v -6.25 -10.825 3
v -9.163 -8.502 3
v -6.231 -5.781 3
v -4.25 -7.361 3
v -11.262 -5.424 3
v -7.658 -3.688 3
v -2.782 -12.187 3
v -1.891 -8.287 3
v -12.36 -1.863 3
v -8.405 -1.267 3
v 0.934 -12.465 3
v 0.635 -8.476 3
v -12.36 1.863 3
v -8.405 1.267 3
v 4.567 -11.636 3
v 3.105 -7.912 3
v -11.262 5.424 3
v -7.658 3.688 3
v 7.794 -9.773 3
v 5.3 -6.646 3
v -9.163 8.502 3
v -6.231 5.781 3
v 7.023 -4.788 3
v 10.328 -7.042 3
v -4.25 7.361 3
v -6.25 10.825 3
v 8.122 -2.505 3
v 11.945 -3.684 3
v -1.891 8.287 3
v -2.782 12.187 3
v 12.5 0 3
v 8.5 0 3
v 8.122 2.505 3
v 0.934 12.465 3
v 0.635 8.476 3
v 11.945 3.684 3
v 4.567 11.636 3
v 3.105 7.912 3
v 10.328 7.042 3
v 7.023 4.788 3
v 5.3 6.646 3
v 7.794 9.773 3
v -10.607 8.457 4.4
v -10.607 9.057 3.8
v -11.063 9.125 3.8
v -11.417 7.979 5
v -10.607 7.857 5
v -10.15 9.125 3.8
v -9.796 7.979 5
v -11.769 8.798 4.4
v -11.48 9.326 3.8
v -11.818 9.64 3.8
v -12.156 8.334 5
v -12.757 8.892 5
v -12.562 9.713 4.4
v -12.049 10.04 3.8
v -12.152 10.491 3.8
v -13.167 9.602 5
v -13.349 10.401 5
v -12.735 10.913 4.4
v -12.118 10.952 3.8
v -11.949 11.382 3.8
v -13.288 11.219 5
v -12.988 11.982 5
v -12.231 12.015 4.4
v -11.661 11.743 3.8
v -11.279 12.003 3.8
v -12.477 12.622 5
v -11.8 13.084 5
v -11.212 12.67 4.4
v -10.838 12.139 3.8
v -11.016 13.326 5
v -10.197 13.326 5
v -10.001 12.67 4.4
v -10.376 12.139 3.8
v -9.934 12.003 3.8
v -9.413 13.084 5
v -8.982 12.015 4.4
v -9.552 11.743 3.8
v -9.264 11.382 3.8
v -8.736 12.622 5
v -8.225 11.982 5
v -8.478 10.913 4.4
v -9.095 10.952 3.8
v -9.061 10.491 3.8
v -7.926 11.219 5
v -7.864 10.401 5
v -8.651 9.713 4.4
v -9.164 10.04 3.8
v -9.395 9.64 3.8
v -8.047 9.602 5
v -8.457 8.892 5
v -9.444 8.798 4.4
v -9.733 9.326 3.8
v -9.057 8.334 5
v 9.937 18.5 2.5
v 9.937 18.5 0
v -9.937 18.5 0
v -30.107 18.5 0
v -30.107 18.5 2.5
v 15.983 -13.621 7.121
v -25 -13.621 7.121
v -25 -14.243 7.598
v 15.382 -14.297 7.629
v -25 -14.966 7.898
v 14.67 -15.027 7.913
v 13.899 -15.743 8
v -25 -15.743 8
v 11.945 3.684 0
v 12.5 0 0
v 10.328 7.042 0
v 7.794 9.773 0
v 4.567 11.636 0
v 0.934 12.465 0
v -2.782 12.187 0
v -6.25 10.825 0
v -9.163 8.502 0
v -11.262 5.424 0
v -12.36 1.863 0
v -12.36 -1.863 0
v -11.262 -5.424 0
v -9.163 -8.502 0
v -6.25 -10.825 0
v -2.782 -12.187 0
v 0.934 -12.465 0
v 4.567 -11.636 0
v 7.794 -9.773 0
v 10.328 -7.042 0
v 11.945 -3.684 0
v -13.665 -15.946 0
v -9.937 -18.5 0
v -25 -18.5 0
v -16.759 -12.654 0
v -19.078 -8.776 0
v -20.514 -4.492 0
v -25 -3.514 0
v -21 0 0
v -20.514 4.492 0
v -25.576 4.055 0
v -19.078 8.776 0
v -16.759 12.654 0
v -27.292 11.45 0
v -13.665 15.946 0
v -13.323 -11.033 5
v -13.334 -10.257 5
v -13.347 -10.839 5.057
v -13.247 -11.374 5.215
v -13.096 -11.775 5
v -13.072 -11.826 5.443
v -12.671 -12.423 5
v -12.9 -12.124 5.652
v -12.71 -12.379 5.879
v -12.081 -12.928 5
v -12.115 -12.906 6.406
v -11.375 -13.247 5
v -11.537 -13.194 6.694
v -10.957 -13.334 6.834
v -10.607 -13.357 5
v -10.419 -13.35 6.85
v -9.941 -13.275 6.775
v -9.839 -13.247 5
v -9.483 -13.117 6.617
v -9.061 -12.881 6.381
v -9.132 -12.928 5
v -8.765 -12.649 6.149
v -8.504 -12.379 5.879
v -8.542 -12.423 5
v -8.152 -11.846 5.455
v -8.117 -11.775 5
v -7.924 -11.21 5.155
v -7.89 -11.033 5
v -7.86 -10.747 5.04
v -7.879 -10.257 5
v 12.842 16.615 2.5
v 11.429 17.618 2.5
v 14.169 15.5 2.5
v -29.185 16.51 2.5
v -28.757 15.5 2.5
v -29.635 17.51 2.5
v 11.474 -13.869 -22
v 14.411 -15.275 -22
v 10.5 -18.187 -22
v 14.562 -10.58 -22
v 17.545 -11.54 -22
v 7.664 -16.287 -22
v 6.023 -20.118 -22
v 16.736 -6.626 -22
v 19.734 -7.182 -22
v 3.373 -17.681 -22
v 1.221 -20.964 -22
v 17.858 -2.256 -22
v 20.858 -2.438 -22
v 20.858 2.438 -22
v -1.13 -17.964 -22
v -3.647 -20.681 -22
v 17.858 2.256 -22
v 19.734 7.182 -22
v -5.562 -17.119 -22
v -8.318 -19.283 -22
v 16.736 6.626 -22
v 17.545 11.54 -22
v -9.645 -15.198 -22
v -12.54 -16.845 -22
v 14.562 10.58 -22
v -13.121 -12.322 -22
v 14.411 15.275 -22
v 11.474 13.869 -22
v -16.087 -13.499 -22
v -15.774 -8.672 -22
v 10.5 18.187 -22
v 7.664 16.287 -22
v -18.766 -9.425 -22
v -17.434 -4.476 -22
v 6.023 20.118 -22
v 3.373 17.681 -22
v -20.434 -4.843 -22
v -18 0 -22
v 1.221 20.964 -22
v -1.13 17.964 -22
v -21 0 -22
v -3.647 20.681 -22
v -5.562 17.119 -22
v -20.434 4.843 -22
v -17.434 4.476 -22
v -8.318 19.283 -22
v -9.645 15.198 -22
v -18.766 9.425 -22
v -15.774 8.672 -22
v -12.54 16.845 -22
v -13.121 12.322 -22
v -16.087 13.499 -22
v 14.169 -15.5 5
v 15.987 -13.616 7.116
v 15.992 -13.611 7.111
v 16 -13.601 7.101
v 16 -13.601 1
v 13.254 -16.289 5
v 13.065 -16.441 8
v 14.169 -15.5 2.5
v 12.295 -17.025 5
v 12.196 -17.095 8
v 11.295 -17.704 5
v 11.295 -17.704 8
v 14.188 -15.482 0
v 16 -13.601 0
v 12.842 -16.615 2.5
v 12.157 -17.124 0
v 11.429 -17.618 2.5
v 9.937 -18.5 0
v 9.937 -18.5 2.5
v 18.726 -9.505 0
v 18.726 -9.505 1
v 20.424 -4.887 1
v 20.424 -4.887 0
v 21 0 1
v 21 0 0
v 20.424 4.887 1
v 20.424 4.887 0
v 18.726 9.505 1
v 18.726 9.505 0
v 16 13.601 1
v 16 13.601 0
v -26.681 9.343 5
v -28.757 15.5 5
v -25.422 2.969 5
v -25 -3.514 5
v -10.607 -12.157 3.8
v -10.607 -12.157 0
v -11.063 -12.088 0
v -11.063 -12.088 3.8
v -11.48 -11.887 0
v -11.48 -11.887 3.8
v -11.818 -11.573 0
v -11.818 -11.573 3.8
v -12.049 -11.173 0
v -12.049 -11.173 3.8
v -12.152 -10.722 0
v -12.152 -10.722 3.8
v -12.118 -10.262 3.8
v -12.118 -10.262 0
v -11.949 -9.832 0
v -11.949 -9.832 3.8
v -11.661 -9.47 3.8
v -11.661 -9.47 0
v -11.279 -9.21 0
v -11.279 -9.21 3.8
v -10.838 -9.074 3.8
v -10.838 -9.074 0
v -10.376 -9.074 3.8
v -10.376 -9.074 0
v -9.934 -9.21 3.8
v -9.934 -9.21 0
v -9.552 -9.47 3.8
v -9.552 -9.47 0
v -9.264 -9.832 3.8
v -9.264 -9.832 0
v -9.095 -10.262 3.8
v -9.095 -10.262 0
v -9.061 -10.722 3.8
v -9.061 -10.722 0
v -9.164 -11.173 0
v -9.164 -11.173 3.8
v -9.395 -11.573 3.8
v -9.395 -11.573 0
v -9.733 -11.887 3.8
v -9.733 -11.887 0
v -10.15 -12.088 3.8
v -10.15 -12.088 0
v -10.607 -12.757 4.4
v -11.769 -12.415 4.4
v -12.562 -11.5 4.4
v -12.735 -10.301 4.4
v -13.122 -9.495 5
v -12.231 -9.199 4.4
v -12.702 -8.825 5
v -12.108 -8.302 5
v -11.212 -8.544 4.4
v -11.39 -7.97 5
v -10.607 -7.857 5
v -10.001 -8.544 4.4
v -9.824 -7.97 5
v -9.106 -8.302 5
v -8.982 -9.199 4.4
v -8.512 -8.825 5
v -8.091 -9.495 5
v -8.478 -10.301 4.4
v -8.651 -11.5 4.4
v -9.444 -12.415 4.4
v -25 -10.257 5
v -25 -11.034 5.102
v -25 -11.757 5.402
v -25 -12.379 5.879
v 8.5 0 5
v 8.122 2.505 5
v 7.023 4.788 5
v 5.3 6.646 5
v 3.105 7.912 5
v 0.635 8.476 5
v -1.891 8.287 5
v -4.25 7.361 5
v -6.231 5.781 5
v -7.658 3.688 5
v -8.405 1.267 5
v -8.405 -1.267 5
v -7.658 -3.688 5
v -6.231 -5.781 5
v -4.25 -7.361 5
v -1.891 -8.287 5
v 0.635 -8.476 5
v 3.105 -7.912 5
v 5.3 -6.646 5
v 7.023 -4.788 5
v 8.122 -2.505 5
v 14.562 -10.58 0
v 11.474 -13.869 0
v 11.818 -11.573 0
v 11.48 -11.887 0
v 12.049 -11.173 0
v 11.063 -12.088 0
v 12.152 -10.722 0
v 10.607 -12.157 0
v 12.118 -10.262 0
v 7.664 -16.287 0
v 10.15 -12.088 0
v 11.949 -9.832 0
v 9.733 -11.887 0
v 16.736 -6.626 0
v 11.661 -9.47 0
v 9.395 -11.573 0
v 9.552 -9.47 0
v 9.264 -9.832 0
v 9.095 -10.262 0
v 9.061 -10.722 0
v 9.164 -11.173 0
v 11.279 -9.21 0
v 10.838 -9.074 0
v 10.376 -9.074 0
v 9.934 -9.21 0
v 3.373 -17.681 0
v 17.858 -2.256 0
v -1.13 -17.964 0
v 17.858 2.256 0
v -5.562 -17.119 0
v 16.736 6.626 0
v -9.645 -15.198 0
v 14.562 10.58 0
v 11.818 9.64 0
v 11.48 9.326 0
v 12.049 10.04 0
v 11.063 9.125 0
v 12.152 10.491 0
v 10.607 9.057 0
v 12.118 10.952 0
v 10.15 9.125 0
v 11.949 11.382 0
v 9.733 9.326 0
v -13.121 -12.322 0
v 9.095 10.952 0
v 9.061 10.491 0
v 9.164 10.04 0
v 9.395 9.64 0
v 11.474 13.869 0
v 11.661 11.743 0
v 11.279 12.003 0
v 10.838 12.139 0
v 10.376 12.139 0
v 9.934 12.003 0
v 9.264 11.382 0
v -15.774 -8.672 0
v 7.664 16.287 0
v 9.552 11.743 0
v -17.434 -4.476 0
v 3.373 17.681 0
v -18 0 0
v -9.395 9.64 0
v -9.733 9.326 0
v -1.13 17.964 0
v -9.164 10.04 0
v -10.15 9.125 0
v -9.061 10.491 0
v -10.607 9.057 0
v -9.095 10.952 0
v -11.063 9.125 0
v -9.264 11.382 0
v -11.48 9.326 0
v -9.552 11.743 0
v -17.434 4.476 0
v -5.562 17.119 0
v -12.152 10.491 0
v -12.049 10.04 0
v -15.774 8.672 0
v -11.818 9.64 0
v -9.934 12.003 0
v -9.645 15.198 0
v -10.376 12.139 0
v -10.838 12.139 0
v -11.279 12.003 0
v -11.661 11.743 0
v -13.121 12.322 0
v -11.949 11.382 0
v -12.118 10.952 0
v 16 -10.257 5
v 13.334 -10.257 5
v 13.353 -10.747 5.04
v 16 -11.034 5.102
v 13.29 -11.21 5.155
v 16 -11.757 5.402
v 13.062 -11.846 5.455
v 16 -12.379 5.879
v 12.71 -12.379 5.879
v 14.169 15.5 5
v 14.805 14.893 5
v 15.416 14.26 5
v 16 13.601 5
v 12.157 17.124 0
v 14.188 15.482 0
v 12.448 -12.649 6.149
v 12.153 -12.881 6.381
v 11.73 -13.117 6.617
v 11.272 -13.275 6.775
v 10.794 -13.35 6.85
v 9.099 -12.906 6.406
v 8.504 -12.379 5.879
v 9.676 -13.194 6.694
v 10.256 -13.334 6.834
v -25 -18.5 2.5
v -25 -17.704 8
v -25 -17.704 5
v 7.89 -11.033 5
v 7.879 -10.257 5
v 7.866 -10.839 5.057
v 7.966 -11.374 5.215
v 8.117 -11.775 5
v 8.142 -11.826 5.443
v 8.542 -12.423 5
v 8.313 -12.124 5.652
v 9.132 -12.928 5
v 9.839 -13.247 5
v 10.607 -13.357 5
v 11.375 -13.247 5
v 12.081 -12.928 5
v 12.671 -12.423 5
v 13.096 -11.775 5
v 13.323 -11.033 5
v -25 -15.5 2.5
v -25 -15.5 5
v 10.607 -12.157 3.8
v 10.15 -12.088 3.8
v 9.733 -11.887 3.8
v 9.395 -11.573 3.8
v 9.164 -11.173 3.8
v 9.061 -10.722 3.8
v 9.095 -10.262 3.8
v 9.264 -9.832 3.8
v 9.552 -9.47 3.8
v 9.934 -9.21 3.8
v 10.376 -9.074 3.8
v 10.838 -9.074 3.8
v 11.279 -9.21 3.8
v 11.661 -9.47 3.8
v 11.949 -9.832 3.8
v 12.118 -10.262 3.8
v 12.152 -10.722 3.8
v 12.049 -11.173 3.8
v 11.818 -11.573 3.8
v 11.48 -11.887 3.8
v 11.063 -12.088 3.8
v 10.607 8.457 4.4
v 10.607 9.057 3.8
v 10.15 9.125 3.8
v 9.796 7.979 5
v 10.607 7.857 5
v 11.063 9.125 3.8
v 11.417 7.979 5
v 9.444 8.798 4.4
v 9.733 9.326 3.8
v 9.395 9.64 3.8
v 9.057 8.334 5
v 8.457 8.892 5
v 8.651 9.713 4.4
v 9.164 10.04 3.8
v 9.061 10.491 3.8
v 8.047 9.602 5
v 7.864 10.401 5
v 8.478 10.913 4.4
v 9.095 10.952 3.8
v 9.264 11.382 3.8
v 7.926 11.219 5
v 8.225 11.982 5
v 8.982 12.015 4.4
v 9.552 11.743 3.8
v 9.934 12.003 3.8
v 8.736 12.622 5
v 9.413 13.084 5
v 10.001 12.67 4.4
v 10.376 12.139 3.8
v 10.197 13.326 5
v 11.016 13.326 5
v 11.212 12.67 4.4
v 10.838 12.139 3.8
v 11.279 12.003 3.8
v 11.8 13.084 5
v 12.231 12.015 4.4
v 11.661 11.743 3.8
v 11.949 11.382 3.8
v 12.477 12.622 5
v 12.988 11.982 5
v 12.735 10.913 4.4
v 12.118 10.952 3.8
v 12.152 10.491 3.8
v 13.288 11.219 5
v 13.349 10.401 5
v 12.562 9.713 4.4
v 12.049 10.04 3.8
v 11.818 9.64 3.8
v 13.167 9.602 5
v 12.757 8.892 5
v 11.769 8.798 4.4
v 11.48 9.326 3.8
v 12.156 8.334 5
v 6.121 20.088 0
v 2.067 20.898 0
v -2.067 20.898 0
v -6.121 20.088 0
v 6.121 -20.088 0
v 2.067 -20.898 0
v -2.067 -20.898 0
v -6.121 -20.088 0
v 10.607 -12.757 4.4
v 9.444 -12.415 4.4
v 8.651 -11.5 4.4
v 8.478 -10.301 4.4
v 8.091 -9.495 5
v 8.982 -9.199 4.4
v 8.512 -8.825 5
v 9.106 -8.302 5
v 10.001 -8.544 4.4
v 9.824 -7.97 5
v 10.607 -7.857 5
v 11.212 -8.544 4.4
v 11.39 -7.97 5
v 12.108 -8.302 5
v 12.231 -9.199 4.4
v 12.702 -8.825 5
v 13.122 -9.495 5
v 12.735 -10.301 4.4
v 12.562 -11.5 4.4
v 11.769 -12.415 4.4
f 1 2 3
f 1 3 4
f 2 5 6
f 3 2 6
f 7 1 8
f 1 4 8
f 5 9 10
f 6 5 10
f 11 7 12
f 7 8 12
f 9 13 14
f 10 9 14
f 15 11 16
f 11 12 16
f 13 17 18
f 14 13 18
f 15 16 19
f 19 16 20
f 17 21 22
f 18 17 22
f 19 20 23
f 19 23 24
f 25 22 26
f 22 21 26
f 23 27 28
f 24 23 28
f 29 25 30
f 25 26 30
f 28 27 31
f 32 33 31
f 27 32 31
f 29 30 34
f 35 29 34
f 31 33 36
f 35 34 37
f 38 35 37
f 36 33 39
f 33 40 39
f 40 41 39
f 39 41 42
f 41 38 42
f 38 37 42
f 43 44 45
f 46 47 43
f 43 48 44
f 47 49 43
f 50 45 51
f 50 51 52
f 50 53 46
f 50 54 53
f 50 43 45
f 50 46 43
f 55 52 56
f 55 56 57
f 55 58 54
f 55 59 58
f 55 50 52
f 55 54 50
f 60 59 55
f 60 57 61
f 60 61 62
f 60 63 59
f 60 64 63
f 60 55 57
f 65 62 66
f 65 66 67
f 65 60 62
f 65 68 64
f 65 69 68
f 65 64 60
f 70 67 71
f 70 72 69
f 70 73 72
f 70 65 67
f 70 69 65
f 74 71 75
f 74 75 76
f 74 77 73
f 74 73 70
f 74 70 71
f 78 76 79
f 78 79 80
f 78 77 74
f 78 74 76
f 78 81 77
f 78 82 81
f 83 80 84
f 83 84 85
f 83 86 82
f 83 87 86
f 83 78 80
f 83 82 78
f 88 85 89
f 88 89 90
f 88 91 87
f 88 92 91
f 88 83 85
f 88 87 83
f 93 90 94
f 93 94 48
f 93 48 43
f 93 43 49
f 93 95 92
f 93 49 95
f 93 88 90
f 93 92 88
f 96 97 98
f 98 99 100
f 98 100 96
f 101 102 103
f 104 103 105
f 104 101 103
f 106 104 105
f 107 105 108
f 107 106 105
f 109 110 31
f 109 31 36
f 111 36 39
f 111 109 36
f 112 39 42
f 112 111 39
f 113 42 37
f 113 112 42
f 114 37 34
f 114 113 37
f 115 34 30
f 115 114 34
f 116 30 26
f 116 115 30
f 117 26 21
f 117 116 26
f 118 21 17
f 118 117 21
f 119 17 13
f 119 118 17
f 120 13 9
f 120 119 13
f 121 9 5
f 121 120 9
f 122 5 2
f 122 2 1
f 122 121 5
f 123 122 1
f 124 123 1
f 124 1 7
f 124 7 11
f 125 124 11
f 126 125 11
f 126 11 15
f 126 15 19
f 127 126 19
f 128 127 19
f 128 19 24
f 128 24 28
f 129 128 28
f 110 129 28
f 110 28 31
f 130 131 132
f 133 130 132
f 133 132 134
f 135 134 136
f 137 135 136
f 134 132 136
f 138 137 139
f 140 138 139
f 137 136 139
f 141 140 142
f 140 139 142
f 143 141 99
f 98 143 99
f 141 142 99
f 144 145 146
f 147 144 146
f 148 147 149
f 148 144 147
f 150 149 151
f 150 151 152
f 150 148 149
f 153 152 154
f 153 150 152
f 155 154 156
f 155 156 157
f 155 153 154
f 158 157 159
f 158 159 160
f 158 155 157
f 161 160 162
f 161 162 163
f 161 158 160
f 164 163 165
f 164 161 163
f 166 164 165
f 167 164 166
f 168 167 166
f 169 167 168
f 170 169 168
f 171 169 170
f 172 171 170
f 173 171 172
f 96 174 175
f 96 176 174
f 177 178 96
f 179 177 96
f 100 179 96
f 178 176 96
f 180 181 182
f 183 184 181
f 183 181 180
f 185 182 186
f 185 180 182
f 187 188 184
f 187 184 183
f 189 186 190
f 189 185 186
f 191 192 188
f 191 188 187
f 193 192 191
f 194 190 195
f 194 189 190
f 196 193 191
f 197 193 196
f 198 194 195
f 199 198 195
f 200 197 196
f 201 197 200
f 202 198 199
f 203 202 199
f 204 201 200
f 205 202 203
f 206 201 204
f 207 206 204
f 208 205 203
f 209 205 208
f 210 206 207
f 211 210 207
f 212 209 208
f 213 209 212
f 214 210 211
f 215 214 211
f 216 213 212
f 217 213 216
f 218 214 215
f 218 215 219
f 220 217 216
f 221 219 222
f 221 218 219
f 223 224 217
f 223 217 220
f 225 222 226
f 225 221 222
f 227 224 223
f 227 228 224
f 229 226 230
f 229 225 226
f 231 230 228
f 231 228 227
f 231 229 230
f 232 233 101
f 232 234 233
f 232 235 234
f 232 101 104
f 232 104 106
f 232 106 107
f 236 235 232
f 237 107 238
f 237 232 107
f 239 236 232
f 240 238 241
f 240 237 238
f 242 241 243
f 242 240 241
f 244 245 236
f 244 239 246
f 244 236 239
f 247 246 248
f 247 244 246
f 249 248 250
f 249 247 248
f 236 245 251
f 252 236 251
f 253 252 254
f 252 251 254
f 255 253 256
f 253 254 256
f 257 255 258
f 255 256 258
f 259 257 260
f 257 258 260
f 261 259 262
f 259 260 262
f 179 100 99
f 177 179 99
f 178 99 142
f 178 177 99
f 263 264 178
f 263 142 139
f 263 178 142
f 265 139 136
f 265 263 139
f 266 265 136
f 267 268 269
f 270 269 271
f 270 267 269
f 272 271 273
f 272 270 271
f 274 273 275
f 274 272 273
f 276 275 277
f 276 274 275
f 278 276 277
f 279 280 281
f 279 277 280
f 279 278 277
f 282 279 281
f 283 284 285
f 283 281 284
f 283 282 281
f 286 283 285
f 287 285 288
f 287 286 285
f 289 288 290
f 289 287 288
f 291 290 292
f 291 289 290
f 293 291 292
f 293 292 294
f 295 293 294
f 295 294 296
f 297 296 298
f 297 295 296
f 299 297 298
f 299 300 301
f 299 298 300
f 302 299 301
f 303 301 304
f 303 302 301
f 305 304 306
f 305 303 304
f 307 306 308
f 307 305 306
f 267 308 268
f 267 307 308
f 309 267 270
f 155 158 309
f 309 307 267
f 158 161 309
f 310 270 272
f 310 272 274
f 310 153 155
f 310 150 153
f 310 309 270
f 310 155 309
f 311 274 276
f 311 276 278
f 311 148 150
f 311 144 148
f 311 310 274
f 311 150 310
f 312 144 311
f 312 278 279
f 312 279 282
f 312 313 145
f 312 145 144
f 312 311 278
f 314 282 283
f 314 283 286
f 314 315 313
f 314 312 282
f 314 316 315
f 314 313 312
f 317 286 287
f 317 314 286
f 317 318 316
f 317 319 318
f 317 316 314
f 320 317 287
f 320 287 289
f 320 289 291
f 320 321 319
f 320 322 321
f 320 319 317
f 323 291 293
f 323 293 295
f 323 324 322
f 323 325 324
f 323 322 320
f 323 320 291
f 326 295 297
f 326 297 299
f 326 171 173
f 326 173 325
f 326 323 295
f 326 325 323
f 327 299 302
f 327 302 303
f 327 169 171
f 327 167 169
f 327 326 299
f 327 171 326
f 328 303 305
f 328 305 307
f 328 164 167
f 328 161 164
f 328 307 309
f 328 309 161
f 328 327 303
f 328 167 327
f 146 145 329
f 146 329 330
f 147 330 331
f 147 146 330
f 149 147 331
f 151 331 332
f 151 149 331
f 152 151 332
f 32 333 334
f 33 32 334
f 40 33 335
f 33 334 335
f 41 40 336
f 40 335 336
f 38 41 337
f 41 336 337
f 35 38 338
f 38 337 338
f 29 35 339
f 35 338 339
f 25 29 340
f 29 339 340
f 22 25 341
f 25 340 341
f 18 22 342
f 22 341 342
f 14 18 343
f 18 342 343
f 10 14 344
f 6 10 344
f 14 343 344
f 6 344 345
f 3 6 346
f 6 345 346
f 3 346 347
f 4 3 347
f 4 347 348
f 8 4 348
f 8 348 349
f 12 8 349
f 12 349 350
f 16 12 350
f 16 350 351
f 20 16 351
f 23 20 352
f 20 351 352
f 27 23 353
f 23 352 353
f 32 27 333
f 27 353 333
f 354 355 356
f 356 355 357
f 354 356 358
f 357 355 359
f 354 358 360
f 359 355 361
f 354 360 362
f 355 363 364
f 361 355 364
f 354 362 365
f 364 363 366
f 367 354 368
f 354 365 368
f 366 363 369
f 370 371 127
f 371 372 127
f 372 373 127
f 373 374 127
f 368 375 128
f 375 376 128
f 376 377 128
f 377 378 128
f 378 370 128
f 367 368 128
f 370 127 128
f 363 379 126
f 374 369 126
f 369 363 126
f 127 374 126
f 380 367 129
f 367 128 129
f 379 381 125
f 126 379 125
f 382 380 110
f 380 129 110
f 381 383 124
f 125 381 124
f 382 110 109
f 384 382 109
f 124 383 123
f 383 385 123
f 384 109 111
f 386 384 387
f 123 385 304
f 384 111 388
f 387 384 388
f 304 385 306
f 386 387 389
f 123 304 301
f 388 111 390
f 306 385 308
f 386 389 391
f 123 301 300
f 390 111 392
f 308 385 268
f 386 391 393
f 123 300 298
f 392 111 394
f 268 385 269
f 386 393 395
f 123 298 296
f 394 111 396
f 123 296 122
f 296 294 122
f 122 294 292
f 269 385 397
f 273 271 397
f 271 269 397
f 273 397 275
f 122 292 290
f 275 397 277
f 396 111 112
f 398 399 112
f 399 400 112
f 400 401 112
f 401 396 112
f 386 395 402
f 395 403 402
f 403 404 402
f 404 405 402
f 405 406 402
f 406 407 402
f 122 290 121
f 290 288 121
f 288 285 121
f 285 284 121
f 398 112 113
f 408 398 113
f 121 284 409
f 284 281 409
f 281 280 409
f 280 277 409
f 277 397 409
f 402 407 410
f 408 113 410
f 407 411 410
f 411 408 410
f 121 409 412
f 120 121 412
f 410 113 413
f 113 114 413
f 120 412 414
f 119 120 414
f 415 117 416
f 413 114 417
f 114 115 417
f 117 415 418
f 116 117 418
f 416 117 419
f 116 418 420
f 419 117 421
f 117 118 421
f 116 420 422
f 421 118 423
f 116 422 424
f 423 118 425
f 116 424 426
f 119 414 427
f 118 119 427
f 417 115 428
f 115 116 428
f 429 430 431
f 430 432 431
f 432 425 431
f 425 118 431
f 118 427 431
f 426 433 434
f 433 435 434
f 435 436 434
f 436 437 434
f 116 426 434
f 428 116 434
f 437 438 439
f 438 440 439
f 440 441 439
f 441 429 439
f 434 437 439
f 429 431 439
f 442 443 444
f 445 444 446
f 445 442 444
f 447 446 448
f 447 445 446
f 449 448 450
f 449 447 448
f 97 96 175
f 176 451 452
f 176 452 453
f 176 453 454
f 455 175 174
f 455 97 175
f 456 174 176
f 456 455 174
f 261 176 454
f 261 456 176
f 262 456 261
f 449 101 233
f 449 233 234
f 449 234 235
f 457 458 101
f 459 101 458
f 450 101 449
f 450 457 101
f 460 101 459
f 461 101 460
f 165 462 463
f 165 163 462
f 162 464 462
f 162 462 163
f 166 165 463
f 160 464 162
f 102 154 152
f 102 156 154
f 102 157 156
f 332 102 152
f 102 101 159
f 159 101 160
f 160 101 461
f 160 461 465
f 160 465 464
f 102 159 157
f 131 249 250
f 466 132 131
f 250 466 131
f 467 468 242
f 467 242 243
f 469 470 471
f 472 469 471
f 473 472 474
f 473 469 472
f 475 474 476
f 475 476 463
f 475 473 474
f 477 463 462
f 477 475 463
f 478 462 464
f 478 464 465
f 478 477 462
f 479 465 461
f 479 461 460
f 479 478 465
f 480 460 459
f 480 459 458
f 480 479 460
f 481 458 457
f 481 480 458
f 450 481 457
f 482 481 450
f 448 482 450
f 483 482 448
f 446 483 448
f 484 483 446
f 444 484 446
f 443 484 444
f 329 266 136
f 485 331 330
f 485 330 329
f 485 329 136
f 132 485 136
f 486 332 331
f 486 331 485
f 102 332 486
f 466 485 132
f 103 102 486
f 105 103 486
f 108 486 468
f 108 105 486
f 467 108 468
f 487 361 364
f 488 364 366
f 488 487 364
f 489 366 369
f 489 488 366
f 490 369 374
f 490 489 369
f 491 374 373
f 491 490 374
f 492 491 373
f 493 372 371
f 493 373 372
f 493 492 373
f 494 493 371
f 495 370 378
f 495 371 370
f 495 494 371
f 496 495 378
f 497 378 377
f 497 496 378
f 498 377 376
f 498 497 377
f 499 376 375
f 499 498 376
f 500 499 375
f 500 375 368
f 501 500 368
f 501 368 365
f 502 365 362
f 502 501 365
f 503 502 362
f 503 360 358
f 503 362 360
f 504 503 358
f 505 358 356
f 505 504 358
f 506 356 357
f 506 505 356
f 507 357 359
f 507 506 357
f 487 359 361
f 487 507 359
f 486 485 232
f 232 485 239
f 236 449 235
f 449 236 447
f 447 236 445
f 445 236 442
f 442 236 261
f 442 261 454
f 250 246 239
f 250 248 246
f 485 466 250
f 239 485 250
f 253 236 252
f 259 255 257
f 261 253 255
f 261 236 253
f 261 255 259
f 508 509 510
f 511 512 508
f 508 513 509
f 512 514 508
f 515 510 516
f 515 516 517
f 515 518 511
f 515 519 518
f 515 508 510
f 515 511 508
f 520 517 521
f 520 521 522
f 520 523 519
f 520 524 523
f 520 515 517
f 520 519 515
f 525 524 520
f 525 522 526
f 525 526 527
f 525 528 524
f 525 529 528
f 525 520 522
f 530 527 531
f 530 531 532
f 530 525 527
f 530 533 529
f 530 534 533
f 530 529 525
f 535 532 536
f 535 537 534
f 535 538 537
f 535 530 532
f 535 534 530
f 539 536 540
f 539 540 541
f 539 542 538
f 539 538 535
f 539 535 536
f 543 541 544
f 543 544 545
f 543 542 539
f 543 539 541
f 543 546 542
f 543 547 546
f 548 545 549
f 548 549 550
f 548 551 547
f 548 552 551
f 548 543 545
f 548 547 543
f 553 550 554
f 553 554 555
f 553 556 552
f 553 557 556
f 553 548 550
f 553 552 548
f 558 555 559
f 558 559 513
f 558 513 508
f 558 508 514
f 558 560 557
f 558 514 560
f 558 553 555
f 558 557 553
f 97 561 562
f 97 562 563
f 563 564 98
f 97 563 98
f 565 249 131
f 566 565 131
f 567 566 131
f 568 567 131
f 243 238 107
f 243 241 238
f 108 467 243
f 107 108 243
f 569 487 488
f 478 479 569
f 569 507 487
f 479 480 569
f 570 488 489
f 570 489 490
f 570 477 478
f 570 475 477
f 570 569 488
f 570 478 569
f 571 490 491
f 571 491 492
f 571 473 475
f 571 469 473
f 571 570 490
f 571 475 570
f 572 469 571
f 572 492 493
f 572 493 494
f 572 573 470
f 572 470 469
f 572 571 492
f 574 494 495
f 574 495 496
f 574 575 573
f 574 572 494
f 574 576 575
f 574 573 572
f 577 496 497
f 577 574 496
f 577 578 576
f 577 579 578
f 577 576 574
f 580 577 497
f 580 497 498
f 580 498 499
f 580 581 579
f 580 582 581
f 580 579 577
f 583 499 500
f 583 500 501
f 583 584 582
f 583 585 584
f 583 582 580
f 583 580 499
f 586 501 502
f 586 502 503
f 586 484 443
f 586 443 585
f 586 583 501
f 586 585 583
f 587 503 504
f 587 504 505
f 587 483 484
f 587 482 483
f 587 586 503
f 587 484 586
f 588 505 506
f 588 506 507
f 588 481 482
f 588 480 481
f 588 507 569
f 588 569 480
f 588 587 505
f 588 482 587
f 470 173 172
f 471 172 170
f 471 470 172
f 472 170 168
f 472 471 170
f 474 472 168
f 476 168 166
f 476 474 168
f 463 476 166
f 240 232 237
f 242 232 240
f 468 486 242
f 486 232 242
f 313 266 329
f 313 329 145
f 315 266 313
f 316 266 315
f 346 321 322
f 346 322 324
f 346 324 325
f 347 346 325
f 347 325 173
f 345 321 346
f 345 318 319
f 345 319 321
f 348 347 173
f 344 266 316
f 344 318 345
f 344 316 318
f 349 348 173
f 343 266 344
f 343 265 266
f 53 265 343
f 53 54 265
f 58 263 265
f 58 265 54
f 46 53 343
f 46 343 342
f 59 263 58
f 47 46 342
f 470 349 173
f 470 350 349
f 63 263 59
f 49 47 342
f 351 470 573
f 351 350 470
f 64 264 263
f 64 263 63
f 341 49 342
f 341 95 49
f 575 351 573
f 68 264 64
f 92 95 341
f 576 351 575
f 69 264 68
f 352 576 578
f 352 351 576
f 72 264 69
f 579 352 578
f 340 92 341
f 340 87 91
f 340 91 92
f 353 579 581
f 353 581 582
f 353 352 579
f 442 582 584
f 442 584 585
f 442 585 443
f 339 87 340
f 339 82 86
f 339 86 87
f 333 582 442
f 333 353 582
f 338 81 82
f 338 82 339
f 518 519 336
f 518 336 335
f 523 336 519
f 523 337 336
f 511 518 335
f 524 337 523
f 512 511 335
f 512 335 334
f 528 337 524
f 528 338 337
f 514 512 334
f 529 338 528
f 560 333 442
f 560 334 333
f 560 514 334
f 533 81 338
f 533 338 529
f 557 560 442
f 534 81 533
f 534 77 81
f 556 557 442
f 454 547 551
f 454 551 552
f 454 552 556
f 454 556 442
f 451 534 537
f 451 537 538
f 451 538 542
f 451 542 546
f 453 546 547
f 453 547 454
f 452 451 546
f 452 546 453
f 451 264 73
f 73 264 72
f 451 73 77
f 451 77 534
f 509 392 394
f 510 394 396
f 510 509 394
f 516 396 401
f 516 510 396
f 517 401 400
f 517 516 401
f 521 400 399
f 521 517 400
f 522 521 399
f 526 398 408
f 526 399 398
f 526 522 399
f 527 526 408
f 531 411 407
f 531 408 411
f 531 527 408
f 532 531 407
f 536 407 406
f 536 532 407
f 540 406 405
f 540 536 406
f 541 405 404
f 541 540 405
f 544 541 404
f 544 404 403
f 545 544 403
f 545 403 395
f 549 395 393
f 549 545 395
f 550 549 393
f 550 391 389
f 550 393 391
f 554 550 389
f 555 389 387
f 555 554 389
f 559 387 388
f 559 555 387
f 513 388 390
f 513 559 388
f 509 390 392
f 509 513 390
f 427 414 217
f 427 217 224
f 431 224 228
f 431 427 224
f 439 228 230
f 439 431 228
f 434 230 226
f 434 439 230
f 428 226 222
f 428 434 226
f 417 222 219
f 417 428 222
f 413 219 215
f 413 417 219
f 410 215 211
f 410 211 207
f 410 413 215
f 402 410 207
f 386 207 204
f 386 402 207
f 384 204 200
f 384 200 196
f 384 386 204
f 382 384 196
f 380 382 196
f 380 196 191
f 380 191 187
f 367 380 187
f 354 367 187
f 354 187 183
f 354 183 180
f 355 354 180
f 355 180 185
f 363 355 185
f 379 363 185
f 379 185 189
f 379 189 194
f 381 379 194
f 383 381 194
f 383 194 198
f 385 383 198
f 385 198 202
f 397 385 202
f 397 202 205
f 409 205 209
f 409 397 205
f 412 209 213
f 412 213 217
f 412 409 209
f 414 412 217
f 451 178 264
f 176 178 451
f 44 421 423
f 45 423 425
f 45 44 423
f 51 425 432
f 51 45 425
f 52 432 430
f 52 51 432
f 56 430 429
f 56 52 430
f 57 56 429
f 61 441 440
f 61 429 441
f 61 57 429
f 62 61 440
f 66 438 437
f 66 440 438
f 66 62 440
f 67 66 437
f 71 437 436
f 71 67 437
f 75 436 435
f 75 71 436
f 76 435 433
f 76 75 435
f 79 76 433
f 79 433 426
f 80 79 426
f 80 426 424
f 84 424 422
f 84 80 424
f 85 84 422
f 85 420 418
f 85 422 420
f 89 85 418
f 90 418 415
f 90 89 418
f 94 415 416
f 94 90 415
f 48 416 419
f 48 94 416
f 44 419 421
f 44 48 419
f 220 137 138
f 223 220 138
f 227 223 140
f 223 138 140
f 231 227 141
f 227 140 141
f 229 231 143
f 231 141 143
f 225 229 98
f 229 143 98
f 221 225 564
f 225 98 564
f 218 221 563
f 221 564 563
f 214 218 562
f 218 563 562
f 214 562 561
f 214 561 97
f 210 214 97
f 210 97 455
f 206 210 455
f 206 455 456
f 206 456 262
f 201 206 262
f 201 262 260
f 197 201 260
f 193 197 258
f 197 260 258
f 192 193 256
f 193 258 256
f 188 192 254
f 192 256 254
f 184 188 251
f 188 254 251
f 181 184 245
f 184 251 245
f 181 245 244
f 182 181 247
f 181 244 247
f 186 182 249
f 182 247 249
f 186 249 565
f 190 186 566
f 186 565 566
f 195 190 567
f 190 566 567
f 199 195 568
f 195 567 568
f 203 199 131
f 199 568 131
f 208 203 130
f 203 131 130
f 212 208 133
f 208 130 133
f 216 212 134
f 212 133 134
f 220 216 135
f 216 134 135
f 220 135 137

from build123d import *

# Parameters (mm, degrees)
SZKIC1_W                                   = 60
SZKIC1_H                                   = 31
SZKIC1_R                                   = 12.5
DODANIE_WYCI_GNI_CIE1_DEPTH                = 5
SZKIC11_R                                  = 12.5
SZKIC11_R_2                                = 8.5
DODANIE_WYCI_GNI_CIE5_DEPTH                = 2
SZKIC7_W                                   = 2.5
SZKIC7_H                                   = 3
DODANIE_WYCI_GNI_CIE3_DEPTH                = 60
ZAOKR_GLENIE1_R                            = 3
WYTNIJ_WYCI_GNI_CIE1_DEPTH                 = 4
WYTNIJ_WYCI_GNI_CIE1_DEPTH_BACK            = 6
SZKIC3_R                                   = 21
SZKIC3_R_2                                 = 18
DODANIE_WYCI_GNI_CIE2_DEPTH                = 22
POG_BIENIE_STO_KOWE_POD_M2_5_RUB_Z_2_COUNT = 2
POG_BIENIE_STO_KOWE_POD_M2_5_RUB_Z_2_PITCH = 21.213203436
POG_BIENIE_STO_KOWE_POD_M2_5_RUB_Z_3_COUNT = 2
POG_BIENIE_STO_KOWE_POD_M2_5_RUB_Z_3_PITCH = 30
POG_BIENIE_STO_KOWE_POD_M2_5_RUB_Z_4_COUNT = 2
POG_BIENIE_STO_KOWE_POD_M2_5_RUB_Z_4_PITCH = 21.213203436
WYTNIJ_WYCI_GNI_CIE3_DEPTH                 = 4
DODANIE_WYCI_GNI_CIE4_DEPTH                = 1
WYTNIJ_WYCI_GNI_CIE2_DEPTH                 = 9


with BuildPart() as part:
    # Szkic1 → Dodanie-wyci_gni_cie1 (new body)
    with BuildSketch(Plane.XY):
        with Locations((-14, 0)):
            Rectangle(SZKIC1_W, SZKIC1_H)
        Circle(SZKIC1_R, mode=Mode.SUBTRACT)
    extrude(amount=DODANIE_WYCI_GNI_CIE1_DEPTH)

    # Szkic11 → Dodanie-wyci_gni_cie5 (add)
    with BuildSketch(Plane.XY.offset(5)):
        Circle(SZKIC11_R)
        Circle(SZKIC11_R_2, mode=Mode.SUBTRACT)
    extrude(amount=-DODANIE_WYCI_GNI_CIE5_DEPTH)

    # Szkic7 → Dodanie-wyci_gni_cie3 (add, through all)
    with BuildSketch(Plane.ZY.offset(44)):
        with Locations((1.25, 17)):
            Rectangle(SZKIC7_W, SZKIC7_H)
        with Locations((1.25, -17)):
            Rectangle(SZKIC7_W, SZKIC7_H)
        Polygon((5, -11.5), (5, -17.703597862), (8, -17.703597862), (8, -14.5), align=None)
    extrude(amount=-DODANIE_WYCI_GNI_CIE3_DEPTH)

    # Zaokr_glenie1
    zaokr_glenie1_edges = [part.edges().sort_by_distance(p)[0] for p in [
        (-14, -14.5, 8),
        (-14, -11.5, 5),
    ]]
    fillet(zaokr_glenie1_edges, radius=ZAOKR_GLENIE1_R)

    # Szkic2 → Wytnij-wyci_gni_cie1 (cut, two sides)
    with BuildSketch(Plane.XY.offset(5)) as wytnij_wyci_gni_cie1_sk:
        with BuildLine():
            Line((-25, -3.514225997), (-25, -20.5))
            Line((-25, -20.5), (-44, -20.5))
            Line((-44, -20.5), (-44, 35.715864495))
            ThreePointArc((-44, 35.715864495), (-30, 18.280268721), (-25, -3.514225997))
        make_face()
    extrude(amount=WYTNIJ_WYCI_GNI_CIE1_DEPTH, mode=Mode.SUBTRACT)
    extrude(wytnij_wyci_gni_cie1_sk.sketch, amount=-WYTNIJ_WYCI_GNI_CIE1_DEPTH_BACK, mode=Mode.SUBTRACT)

    # Szkic3 → Dodanie-wyci_gni_cie2 (add)
    with BuildSketch(Plane(origin=(0, 0, 0), x_dir=(-1, 0, 0), z_dir=(0, 0, -1))):
        Circle(SZKIC3_R)
        Circle(SZKIC3_R_2, mode=Mode.SUBTRACT)
    extrude(amount=DODANIE_WYCI_GNI_CIE2_DEPTH)

    # Szkic6 → Pog_bienie sto_kowe pod M2.5 _rub_ z _be (revolve, cut)
    with BuildSketch(Plane(origin=(-10.606601718, 10.606601718, 5), x_dir=(0, -1, 0), z_dir=(1, 0, 0))):
        Polygon((0, 0), (0, 27), (1.55, 27), (1.55, 1.2), (2.75, 0), align=None)
    pog_bienie_sto_kowe_pod_m2_5_rub_z_be = revolve(axis=Axis((-10.606601718, 10.606601718, 11.35), (0, 0, -1)), mode=Mode.SUBTRACT)

    # Pog_bienie sto_kowe pod M2.5 _rub_ z 2: Pog_bienie sto_kowe pod M2.5 _rub_ z _be ×2
    with Locations(*[(0, -i * POG_BIENIE_STO_KOWE_POD_M2_5_RUB_Z_2_PITCH, 0) for i in range(1, POG_BIENIE_STO_KOWE_POD_M2_5_RUB_Z_2_COUNT)]):
        add(pog_bienie_sto_kowe_pod_m2_5_rub_z_be, mode=Mode.SUBTRACT)

    # Pog_bienie sto_kowe pod M2.5 _rub_ z 3: Pog_bienie sto_kowe pod M2.5 _rub_ z _be ×2
    with Locations(*[Vector(0.707106781, -0.707106781, 0) * (i * POG_BIENIE_STO_KOWE_POD_M2_5_RUB_Z_3_PITCH) for i in range(1, POG_BIENIE_STO_KOWE_POD_M2_5_RUB_Z_3_COUNT)]):
        add(pog_bienie_sto_kowe_pod_m2_5_rub_z_be, mode=Mode.SUBTRACT)

    # Pog_bienie sto_kowe pod M2.5 _rub_ z 4: Pog_bienie sto_kowe pod M2.5 _rub_ z _be ×2
    with Locations(*[(i * POG_BIENIE_STO_KOWE_POD_M2_5_RUB_Z_4_PITCH, 0, 0) for i in range(1, POG_BIENIE_STO_KOWE_POD_M2_5_RUB_Z_4_COUNT)]):
        add(pog_bienie_sto_kowe_pod_m2_5_rub_z_be, mode=Mode.SUBTRACT)

    # Szkic15 → Wytnij-wyci_gni_cie3 (cut, through all)
    with BuildSketch(Plane.XY.offset(5)):
        with BuildLine():
            ThreePointArc((-13.334335162, -10.257359313), (-10.606601718, -13.356601718), (-7.878868274, -10.257359313))
            ThreePointArc((-7.878868274, -10.257359313), (-10.606601718, -7.856601718), (-13.334335162, -10.257359313))
        make_face()
        with BuildLine():
            ThreePointArc((7.878868274, -10.257359313), (10.606601718, -13.356601718), (13.334335162, -10.257359313))
            ThreePointArc((13.334335162, -10.257359313), (10.606601718, -7.856601718), (7.878868274, -10.257359313))
        make_face()
    extrude(amount=WYTNIJ_WYCI_GNI_CIE3_DEPTH, mode=Mode.SUBTRACT)

    # Szkic8 → Dodanie-wyci_gni_cie4 (add)
    with BuildSketch(Plane.XY):
        with BuildLine():
            Line((16, 13.601470509), (16, -13.601470509))
            ThreePointArc((16, -13.601470509), (21, 0), (16, 13.601470509))
        make_face()
    extrude(amount=DODANIE_WYCI_GNI_CIE4_DEPTH)

    # Szkic8_3 → Wytnij-wyci_gni_cie2 (cut, through all)
    with BuildSketch(Plane.XY):
        with BuildLine():
            ThreePointArc((9.937303457, 18.5), (13.19790989, 16.334478092), (16, 13.601470509))
            Line((16, 13.601470509), (16, 18.5))
            Line((16, 18.5), (9.937303457, 18.5))
        make_face()
        with BuildLine():
            Line((16, -18.5), (16, -13.601470509))
            ThreePointArc((16, -13.601470509), (13.19790989, -16.334478092), (9.937303457, -18.5))
            Line((9.937303457, -18.5), (16, -18.5))
        make_face()
    extrude(amount=WYTNIJ_WYCI_GNI_CIE2_DEPTH, mode=Mode.SUBTRACT)


solid = part.part
